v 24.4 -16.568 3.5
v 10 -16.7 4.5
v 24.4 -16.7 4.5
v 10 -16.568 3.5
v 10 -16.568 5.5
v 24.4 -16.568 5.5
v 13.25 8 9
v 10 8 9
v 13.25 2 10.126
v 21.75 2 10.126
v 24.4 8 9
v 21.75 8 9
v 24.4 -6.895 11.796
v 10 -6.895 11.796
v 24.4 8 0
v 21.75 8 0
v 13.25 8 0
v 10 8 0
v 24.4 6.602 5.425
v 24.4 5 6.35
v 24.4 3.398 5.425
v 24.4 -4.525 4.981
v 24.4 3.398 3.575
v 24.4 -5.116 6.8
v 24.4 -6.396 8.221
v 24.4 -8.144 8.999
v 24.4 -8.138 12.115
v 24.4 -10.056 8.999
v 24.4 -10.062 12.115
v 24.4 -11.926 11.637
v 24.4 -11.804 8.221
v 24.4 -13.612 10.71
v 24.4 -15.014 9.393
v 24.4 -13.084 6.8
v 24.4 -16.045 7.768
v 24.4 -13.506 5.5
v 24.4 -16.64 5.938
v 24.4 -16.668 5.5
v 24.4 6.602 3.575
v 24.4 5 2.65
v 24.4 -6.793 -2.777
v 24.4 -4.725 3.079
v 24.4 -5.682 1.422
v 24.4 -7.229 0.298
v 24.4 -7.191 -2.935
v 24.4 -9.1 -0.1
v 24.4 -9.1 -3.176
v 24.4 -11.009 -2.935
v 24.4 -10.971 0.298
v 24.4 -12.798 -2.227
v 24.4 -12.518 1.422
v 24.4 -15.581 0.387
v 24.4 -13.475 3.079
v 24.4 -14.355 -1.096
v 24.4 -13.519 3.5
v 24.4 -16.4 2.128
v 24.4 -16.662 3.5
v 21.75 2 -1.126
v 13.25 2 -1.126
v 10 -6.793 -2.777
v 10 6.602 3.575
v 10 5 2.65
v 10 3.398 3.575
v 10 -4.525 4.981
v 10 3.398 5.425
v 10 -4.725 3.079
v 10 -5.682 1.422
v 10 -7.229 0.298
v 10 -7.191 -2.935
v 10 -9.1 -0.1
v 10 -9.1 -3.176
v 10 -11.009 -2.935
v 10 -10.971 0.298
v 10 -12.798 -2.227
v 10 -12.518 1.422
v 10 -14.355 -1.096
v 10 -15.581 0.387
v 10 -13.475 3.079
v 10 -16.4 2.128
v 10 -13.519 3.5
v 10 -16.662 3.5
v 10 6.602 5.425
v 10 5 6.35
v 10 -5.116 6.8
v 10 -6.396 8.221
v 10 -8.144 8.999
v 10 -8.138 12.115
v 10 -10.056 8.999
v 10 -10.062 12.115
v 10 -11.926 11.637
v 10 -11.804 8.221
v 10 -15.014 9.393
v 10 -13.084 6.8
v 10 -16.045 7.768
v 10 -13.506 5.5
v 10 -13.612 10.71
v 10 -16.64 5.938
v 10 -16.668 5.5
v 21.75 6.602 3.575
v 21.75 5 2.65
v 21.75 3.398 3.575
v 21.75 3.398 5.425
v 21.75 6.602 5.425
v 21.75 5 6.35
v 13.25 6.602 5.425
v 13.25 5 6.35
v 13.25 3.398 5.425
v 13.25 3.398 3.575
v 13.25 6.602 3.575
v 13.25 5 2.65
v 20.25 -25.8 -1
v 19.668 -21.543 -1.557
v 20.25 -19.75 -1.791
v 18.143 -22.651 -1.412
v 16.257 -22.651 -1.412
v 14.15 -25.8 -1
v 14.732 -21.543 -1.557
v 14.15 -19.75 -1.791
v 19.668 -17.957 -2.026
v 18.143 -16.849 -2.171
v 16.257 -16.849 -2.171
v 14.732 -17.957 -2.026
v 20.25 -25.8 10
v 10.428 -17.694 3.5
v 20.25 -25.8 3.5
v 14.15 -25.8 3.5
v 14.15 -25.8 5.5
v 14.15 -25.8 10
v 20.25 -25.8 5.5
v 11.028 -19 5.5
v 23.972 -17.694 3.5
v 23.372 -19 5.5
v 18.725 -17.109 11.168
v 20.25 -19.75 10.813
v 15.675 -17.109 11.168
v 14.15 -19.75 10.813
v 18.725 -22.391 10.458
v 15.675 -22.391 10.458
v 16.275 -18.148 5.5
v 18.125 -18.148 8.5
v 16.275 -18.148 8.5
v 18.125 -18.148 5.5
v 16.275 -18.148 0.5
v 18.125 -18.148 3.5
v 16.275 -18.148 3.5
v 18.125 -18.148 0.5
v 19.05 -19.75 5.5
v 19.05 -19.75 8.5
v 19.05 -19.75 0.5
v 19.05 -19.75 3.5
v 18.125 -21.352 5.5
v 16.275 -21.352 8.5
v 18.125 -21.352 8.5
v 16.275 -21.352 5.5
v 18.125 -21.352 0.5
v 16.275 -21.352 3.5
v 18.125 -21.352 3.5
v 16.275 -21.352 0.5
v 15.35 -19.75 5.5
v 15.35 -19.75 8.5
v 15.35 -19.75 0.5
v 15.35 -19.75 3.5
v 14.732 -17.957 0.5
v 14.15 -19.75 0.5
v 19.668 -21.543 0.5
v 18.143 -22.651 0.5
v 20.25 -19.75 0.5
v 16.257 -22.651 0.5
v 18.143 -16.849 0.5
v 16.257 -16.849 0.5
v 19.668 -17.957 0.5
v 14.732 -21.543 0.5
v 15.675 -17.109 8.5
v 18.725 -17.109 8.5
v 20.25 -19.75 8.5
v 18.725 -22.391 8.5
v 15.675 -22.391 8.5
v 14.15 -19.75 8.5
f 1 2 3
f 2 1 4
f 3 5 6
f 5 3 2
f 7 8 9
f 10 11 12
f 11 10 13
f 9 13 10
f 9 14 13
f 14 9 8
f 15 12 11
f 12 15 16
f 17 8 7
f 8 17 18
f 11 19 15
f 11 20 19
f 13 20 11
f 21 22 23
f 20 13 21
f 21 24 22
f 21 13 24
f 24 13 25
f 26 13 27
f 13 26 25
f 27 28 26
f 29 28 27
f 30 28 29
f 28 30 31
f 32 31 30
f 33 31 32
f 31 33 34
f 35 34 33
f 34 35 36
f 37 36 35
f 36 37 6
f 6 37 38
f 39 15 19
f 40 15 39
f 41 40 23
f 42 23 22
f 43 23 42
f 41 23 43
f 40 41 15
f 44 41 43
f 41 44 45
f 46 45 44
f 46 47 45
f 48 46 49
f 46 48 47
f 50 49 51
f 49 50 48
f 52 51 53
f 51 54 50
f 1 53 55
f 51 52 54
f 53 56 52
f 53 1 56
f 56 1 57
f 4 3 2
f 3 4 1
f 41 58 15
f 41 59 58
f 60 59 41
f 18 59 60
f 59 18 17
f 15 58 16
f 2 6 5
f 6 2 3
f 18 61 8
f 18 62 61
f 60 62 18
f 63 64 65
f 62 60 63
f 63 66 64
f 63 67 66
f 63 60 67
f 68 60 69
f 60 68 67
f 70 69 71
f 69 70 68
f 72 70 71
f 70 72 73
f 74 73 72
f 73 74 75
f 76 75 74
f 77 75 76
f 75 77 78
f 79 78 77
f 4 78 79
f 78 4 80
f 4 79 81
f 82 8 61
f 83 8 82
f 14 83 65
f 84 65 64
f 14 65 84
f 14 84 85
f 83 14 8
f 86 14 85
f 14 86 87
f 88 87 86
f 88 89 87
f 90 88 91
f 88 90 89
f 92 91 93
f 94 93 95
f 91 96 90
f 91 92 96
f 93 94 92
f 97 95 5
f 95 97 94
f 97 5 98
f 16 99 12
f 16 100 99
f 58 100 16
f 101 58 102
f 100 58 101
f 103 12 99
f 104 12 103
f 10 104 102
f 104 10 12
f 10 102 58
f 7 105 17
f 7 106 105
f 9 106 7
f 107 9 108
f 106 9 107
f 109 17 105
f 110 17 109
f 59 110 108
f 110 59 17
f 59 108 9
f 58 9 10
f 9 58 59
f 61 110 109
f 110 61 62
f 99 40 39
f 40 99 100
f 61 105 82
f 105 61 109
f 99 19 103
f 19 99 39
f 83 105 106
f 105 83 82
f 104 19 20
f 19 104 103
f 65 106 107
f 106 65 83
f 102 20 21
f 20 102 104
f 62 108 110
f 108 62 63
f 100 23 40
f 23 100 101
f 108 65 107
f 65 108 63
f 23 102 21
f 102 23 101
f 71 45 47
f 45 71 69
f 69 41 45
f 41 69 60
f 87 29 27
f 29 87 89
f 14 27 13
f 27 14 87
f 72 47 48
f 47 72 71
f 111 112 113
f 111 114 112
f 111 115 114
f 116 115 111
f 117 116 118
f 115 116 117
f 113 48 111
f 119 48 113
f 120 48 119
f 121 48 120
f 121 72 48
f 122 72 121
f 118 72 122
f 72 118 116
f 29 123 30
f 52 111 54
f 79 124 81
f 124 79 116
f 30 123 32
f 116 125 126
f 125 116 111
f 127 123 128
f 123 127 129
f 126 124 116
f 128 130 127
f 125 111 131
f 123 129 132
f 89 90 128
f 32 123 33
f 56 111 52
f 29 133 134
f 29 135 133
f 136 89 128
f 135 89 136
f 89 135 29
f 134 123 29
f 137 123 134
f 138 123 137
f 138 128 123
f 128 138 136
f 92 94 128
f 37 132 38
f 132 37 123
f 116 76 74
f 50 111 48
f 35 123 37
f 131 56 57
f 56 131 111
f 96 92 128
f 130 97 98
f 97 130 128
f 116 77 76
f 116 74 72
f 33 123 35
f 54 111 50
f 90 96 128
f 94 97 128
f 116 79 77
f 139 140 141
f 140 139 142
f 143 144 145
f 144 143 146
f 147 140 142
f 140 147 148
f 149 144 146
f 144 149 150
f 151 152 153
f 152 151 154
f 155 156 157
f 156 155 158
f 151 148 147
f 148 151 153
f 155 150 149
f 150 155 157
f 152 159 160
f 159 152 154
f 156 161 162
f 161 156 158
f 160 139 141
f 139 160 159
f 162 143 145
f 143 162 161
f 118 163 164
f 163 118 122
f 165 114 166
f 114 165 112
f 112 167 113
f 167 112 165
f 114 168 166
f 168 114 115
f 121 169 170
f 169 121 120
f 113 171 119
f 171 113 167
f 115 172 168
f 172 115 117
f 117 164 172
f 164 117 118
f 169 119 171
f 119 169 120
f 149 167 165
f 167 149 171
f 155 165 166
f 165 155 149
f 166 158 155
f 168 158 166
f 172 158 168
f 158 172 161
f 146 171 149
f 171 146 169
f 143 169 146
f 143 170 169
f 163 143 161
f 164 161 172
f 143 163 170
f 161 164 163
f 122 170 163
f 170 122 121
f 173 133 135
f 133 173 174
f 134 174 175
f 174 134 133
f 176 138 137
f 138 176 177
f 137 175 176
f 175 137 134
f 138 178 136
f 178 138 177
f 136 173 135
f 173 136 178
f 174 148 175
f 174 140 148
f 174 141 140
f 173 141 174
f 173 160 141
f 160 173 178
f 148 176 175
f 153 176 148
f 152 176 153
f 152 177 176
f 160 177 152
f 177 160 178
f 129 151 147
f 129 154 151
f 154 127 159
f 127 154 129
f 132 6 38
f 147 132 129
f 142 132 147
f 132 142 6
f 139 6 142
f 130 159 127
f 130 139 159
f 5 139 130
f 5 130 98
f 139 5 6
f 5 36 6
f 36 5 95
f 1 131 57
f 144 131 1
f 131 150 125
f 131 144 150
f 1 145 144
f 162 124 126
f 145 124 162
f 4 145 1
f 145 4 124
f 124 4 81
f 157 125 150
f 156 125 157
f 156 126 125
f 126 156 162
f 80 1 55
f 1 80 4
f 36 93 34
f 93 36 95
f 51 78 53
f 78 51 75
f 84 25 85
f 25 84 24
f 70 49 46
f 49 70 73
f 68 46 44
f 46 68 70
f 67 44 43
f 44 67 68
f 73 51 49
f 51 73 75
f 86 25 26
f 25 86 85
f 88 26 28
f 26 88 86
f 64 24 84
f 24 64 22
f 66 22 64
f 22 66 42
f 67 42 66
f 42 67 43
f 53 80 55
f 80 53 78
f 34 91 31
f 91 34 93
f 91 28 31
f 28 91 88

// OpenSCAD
$fn = 0;

enable_angledtabs = 1;  // [0,1]
enable_ledge = 1;  // [0,1]
clamp_height = 9;  // [0:200]
clamp_length = 8; // [0:200]
clamp_width = 15; // [0:200]
//clamp_depth = 10;  // how deep into the part the gap proceeds
clamp_gap_depth = 7;  // [2:190]
slot_gap = 2;  // [2:190]
plate_thickness = 8.5; // [2:190]
screw_hole_diam = 3.7;  // [1:20]
screw_hole_depth = 4;  // [0:20]
screw_recess_diam = 6.1; // [0:20]
wiretab_angle = 90;  // [-270:270]
nut_type = 6; // [4:6]
wire_diam = 9.2; // [1:40]

hinged_pole_clamp(
clamp_width=clamp_width,
  depth = 10,
  length = clamp_length + 1,
  gap=clamp_gap_depth,
  height=clamp_height,
  hole_diam=screw_hole_diam,
  hole_recess_diam=screw_recess_diam,
  wirediam=wire_diam,
  nut_type=nut_type
  );


module hinged_pole_clamp(
    depth,
    length,
    gap,
    height,
    hole_diam,
    clamp_width,
    hole_recess_diam,
    wirediam,
    horiz_tab_angle=40,
    horiz_thick=3,
    nut_type=6
){
  hinge_fill_x = depth; //hardcoded to fit the hinge footprint
  hinge_fill_y = length;
  hinge_fill_z = height;
  hole_gap = gap;
  hole_r = hole_diam/2;
  pole_r = clamp_width/2;
  hole_recess_r = hole_recess_diam/2;
    

  wire_r = wirediam/2;

  half_space = 0; // gap between the two halfs
  half_width = clamp_width * 1.2;
  half_depth = clamp_width * 0.6;
    union(){
      difference(){
          
          //back portion
        hull(){
           

//square portion
          translate([hinge_fill_x,-1 ,0])
              cube(size=[half_width*0.8, length, hinge_fill_z]);

//ledge
            if (enable_ledge == 1)
            {
          translate([hinge_fill_x,0-(clamp_width/2)+(horiz_thick)-(wire_r),height/2])
            pole_with_tabs_neg(
              width=half_width*0.8,
              pole_r=wire_r,
              pole_thick=horiz_thick,
              hole_diam=screw_hole_diam,
              tab=false,
              tab_angle=horiz_tab_angle);
            }
        }


        // wire hole
        translate([
            hinge_fill_x-(clamp_width*0.1),
            0-(clamp_width/2)+(horiz_thick)-(wire_r),
            height/2])
          pole_with_tabs_neg(
            width=half_width*0.9,
            pole_r=wire_r,
            pole_thick=horiz_thick,
            hole_diam=screw_hole_diam,
            tab=true,
            tab_angle=horiz_tab_angle);
        echo(( depth + (clamp_width / 2 ) - (plate_thickness /2) ));
        // plate slot
        //translate([ ((hinge_fill_x * 2)), length / 2 - clamp_gap +.25 ,hinge_fill_x + 1]) 
        //translate([ (clamp_width / 2 + (plate_thickness * 2)) + 2, length / 2 - clamp_gap_depth +.25 ,height  + 10  ]) 
            translate([ ( depth + (clamp_width / 2 ) - (plate_thickness /2)), (length - clamp_gap_depth),height  + 10  ]) 
            rotate(a=90, v=[0,1,0]) 
            cube(size=[height + 20, hole_gap, plate_thickness]);
            
        //screw hole
            translate([0, length - screw_hole_depth,height/2])
            rotate(a=90, v=[0,1,0])
            cylinder(h=hinge_fill_x * 4, r=hole_diam/2);

      }


        // the hole and fin
      translate([
          hinge_fill_x,
          0-(clamp_width/2)+(horiz_thick)-(wire_r),
          height/2])
        pole_with_tabs(
          width=half_width*0.8,
          pole_r=wire_r,
          pole_thick=horiz_thick,
          hole_diam=screw_hole_diam,
          hole_recess_diam=screw_recess_diam,
          nut_type=nut_type,
          tab_angle=horiz_tab_angle);

    }
}



//*********************************************************

module pole_with_tabs_neg(width, pole_r, pole_thick, hole_diam, tab=false, tab_angle=0, gap=1){
  rotate(a=90, v=[0,1,0]){
    cylinder(h=width, r=pole_r+pole_thick);
  }

  if(tab==true){
    // screw hole in tab
    rotate(a=tab_angle, v=[1,0,0])
      translate([width/2,
                 0,
                 pole_r+(pole_thick)+hole_diam ]) {
        // tab gap
        cube([width*1.1, gap, (hole_diam*2)+(pole_thick*3)], center=true);
      }
  }
}


module pole_with_tabs(width, pole_r, pole_thick, hole_diam, hole_recess_diam, nut_type=6, tab_angle=0, gap=1){
  hole_r = hole_diam/2;
  difference(){
    union(){
      rotate(a=90, v=[0,1,0]){
        cylinder(h=width, r=(pole_r+pole_thick)*1.01);
      }

      // tab block
      hull(){
          
          //angled tab sides
          if (enable_angledtabs == 1){
            rotate(a=90, v=[0,1,0]){
              cylinder(h=width, r=(pole_r+pole_thick)*1.01);
            }
          }
        
        //tab
        rotate(a=wiretab_angle, v=[1,0,0])
          translate([width/2, 0, ((hole_recess_diam)+(pole_thick*2)+pole_r)/2]){
            cube([
              hole_recess_diam,
              (pole_thick*2)+5,
              (hole_recess_diam)+(pole_thick*2)+pole_r],
              center=true);
          }
        }
    }

    // pole hole
    translate([0-(width*0.5), 0, 0])
      rotate(a=90, v=[0,1,0]){
        cylinder(h=width*2.0, r=pole_r);
      }

    // screw hole in tab
    rotate(a=wiretab_angle, v=[1,0,0])
      translate([width/2,
                 0,
                 pole_r+(pole_thick)+(hole_recess_diam/2) ]) {

        // screw hole
        rotate(a=90, v=[1,0,0]){
          cylinder(h=pole_r*3, r=hole_r, center=true);

          //screw recesses
          translate([0, 0, 0+(pole_r/2)+(pole_thick+gap)]){
            cylinder(h=pole_r, r=hole_recess_diam/2, center=true);
          }
          
          // nut recess
          translate([0, 0, 0-(pole_r/2)-(pole_thick+gap)]){
            cylinder(h=pole_r, r=hole_recess_diam/2, center=true, $fn=nut_type);
          }
        }

        // tab gap
        cube([width*1.1, slot_gap, (hole_recess_diam*2)+(pole_thick*3)], center=true);
      }
  }

}
